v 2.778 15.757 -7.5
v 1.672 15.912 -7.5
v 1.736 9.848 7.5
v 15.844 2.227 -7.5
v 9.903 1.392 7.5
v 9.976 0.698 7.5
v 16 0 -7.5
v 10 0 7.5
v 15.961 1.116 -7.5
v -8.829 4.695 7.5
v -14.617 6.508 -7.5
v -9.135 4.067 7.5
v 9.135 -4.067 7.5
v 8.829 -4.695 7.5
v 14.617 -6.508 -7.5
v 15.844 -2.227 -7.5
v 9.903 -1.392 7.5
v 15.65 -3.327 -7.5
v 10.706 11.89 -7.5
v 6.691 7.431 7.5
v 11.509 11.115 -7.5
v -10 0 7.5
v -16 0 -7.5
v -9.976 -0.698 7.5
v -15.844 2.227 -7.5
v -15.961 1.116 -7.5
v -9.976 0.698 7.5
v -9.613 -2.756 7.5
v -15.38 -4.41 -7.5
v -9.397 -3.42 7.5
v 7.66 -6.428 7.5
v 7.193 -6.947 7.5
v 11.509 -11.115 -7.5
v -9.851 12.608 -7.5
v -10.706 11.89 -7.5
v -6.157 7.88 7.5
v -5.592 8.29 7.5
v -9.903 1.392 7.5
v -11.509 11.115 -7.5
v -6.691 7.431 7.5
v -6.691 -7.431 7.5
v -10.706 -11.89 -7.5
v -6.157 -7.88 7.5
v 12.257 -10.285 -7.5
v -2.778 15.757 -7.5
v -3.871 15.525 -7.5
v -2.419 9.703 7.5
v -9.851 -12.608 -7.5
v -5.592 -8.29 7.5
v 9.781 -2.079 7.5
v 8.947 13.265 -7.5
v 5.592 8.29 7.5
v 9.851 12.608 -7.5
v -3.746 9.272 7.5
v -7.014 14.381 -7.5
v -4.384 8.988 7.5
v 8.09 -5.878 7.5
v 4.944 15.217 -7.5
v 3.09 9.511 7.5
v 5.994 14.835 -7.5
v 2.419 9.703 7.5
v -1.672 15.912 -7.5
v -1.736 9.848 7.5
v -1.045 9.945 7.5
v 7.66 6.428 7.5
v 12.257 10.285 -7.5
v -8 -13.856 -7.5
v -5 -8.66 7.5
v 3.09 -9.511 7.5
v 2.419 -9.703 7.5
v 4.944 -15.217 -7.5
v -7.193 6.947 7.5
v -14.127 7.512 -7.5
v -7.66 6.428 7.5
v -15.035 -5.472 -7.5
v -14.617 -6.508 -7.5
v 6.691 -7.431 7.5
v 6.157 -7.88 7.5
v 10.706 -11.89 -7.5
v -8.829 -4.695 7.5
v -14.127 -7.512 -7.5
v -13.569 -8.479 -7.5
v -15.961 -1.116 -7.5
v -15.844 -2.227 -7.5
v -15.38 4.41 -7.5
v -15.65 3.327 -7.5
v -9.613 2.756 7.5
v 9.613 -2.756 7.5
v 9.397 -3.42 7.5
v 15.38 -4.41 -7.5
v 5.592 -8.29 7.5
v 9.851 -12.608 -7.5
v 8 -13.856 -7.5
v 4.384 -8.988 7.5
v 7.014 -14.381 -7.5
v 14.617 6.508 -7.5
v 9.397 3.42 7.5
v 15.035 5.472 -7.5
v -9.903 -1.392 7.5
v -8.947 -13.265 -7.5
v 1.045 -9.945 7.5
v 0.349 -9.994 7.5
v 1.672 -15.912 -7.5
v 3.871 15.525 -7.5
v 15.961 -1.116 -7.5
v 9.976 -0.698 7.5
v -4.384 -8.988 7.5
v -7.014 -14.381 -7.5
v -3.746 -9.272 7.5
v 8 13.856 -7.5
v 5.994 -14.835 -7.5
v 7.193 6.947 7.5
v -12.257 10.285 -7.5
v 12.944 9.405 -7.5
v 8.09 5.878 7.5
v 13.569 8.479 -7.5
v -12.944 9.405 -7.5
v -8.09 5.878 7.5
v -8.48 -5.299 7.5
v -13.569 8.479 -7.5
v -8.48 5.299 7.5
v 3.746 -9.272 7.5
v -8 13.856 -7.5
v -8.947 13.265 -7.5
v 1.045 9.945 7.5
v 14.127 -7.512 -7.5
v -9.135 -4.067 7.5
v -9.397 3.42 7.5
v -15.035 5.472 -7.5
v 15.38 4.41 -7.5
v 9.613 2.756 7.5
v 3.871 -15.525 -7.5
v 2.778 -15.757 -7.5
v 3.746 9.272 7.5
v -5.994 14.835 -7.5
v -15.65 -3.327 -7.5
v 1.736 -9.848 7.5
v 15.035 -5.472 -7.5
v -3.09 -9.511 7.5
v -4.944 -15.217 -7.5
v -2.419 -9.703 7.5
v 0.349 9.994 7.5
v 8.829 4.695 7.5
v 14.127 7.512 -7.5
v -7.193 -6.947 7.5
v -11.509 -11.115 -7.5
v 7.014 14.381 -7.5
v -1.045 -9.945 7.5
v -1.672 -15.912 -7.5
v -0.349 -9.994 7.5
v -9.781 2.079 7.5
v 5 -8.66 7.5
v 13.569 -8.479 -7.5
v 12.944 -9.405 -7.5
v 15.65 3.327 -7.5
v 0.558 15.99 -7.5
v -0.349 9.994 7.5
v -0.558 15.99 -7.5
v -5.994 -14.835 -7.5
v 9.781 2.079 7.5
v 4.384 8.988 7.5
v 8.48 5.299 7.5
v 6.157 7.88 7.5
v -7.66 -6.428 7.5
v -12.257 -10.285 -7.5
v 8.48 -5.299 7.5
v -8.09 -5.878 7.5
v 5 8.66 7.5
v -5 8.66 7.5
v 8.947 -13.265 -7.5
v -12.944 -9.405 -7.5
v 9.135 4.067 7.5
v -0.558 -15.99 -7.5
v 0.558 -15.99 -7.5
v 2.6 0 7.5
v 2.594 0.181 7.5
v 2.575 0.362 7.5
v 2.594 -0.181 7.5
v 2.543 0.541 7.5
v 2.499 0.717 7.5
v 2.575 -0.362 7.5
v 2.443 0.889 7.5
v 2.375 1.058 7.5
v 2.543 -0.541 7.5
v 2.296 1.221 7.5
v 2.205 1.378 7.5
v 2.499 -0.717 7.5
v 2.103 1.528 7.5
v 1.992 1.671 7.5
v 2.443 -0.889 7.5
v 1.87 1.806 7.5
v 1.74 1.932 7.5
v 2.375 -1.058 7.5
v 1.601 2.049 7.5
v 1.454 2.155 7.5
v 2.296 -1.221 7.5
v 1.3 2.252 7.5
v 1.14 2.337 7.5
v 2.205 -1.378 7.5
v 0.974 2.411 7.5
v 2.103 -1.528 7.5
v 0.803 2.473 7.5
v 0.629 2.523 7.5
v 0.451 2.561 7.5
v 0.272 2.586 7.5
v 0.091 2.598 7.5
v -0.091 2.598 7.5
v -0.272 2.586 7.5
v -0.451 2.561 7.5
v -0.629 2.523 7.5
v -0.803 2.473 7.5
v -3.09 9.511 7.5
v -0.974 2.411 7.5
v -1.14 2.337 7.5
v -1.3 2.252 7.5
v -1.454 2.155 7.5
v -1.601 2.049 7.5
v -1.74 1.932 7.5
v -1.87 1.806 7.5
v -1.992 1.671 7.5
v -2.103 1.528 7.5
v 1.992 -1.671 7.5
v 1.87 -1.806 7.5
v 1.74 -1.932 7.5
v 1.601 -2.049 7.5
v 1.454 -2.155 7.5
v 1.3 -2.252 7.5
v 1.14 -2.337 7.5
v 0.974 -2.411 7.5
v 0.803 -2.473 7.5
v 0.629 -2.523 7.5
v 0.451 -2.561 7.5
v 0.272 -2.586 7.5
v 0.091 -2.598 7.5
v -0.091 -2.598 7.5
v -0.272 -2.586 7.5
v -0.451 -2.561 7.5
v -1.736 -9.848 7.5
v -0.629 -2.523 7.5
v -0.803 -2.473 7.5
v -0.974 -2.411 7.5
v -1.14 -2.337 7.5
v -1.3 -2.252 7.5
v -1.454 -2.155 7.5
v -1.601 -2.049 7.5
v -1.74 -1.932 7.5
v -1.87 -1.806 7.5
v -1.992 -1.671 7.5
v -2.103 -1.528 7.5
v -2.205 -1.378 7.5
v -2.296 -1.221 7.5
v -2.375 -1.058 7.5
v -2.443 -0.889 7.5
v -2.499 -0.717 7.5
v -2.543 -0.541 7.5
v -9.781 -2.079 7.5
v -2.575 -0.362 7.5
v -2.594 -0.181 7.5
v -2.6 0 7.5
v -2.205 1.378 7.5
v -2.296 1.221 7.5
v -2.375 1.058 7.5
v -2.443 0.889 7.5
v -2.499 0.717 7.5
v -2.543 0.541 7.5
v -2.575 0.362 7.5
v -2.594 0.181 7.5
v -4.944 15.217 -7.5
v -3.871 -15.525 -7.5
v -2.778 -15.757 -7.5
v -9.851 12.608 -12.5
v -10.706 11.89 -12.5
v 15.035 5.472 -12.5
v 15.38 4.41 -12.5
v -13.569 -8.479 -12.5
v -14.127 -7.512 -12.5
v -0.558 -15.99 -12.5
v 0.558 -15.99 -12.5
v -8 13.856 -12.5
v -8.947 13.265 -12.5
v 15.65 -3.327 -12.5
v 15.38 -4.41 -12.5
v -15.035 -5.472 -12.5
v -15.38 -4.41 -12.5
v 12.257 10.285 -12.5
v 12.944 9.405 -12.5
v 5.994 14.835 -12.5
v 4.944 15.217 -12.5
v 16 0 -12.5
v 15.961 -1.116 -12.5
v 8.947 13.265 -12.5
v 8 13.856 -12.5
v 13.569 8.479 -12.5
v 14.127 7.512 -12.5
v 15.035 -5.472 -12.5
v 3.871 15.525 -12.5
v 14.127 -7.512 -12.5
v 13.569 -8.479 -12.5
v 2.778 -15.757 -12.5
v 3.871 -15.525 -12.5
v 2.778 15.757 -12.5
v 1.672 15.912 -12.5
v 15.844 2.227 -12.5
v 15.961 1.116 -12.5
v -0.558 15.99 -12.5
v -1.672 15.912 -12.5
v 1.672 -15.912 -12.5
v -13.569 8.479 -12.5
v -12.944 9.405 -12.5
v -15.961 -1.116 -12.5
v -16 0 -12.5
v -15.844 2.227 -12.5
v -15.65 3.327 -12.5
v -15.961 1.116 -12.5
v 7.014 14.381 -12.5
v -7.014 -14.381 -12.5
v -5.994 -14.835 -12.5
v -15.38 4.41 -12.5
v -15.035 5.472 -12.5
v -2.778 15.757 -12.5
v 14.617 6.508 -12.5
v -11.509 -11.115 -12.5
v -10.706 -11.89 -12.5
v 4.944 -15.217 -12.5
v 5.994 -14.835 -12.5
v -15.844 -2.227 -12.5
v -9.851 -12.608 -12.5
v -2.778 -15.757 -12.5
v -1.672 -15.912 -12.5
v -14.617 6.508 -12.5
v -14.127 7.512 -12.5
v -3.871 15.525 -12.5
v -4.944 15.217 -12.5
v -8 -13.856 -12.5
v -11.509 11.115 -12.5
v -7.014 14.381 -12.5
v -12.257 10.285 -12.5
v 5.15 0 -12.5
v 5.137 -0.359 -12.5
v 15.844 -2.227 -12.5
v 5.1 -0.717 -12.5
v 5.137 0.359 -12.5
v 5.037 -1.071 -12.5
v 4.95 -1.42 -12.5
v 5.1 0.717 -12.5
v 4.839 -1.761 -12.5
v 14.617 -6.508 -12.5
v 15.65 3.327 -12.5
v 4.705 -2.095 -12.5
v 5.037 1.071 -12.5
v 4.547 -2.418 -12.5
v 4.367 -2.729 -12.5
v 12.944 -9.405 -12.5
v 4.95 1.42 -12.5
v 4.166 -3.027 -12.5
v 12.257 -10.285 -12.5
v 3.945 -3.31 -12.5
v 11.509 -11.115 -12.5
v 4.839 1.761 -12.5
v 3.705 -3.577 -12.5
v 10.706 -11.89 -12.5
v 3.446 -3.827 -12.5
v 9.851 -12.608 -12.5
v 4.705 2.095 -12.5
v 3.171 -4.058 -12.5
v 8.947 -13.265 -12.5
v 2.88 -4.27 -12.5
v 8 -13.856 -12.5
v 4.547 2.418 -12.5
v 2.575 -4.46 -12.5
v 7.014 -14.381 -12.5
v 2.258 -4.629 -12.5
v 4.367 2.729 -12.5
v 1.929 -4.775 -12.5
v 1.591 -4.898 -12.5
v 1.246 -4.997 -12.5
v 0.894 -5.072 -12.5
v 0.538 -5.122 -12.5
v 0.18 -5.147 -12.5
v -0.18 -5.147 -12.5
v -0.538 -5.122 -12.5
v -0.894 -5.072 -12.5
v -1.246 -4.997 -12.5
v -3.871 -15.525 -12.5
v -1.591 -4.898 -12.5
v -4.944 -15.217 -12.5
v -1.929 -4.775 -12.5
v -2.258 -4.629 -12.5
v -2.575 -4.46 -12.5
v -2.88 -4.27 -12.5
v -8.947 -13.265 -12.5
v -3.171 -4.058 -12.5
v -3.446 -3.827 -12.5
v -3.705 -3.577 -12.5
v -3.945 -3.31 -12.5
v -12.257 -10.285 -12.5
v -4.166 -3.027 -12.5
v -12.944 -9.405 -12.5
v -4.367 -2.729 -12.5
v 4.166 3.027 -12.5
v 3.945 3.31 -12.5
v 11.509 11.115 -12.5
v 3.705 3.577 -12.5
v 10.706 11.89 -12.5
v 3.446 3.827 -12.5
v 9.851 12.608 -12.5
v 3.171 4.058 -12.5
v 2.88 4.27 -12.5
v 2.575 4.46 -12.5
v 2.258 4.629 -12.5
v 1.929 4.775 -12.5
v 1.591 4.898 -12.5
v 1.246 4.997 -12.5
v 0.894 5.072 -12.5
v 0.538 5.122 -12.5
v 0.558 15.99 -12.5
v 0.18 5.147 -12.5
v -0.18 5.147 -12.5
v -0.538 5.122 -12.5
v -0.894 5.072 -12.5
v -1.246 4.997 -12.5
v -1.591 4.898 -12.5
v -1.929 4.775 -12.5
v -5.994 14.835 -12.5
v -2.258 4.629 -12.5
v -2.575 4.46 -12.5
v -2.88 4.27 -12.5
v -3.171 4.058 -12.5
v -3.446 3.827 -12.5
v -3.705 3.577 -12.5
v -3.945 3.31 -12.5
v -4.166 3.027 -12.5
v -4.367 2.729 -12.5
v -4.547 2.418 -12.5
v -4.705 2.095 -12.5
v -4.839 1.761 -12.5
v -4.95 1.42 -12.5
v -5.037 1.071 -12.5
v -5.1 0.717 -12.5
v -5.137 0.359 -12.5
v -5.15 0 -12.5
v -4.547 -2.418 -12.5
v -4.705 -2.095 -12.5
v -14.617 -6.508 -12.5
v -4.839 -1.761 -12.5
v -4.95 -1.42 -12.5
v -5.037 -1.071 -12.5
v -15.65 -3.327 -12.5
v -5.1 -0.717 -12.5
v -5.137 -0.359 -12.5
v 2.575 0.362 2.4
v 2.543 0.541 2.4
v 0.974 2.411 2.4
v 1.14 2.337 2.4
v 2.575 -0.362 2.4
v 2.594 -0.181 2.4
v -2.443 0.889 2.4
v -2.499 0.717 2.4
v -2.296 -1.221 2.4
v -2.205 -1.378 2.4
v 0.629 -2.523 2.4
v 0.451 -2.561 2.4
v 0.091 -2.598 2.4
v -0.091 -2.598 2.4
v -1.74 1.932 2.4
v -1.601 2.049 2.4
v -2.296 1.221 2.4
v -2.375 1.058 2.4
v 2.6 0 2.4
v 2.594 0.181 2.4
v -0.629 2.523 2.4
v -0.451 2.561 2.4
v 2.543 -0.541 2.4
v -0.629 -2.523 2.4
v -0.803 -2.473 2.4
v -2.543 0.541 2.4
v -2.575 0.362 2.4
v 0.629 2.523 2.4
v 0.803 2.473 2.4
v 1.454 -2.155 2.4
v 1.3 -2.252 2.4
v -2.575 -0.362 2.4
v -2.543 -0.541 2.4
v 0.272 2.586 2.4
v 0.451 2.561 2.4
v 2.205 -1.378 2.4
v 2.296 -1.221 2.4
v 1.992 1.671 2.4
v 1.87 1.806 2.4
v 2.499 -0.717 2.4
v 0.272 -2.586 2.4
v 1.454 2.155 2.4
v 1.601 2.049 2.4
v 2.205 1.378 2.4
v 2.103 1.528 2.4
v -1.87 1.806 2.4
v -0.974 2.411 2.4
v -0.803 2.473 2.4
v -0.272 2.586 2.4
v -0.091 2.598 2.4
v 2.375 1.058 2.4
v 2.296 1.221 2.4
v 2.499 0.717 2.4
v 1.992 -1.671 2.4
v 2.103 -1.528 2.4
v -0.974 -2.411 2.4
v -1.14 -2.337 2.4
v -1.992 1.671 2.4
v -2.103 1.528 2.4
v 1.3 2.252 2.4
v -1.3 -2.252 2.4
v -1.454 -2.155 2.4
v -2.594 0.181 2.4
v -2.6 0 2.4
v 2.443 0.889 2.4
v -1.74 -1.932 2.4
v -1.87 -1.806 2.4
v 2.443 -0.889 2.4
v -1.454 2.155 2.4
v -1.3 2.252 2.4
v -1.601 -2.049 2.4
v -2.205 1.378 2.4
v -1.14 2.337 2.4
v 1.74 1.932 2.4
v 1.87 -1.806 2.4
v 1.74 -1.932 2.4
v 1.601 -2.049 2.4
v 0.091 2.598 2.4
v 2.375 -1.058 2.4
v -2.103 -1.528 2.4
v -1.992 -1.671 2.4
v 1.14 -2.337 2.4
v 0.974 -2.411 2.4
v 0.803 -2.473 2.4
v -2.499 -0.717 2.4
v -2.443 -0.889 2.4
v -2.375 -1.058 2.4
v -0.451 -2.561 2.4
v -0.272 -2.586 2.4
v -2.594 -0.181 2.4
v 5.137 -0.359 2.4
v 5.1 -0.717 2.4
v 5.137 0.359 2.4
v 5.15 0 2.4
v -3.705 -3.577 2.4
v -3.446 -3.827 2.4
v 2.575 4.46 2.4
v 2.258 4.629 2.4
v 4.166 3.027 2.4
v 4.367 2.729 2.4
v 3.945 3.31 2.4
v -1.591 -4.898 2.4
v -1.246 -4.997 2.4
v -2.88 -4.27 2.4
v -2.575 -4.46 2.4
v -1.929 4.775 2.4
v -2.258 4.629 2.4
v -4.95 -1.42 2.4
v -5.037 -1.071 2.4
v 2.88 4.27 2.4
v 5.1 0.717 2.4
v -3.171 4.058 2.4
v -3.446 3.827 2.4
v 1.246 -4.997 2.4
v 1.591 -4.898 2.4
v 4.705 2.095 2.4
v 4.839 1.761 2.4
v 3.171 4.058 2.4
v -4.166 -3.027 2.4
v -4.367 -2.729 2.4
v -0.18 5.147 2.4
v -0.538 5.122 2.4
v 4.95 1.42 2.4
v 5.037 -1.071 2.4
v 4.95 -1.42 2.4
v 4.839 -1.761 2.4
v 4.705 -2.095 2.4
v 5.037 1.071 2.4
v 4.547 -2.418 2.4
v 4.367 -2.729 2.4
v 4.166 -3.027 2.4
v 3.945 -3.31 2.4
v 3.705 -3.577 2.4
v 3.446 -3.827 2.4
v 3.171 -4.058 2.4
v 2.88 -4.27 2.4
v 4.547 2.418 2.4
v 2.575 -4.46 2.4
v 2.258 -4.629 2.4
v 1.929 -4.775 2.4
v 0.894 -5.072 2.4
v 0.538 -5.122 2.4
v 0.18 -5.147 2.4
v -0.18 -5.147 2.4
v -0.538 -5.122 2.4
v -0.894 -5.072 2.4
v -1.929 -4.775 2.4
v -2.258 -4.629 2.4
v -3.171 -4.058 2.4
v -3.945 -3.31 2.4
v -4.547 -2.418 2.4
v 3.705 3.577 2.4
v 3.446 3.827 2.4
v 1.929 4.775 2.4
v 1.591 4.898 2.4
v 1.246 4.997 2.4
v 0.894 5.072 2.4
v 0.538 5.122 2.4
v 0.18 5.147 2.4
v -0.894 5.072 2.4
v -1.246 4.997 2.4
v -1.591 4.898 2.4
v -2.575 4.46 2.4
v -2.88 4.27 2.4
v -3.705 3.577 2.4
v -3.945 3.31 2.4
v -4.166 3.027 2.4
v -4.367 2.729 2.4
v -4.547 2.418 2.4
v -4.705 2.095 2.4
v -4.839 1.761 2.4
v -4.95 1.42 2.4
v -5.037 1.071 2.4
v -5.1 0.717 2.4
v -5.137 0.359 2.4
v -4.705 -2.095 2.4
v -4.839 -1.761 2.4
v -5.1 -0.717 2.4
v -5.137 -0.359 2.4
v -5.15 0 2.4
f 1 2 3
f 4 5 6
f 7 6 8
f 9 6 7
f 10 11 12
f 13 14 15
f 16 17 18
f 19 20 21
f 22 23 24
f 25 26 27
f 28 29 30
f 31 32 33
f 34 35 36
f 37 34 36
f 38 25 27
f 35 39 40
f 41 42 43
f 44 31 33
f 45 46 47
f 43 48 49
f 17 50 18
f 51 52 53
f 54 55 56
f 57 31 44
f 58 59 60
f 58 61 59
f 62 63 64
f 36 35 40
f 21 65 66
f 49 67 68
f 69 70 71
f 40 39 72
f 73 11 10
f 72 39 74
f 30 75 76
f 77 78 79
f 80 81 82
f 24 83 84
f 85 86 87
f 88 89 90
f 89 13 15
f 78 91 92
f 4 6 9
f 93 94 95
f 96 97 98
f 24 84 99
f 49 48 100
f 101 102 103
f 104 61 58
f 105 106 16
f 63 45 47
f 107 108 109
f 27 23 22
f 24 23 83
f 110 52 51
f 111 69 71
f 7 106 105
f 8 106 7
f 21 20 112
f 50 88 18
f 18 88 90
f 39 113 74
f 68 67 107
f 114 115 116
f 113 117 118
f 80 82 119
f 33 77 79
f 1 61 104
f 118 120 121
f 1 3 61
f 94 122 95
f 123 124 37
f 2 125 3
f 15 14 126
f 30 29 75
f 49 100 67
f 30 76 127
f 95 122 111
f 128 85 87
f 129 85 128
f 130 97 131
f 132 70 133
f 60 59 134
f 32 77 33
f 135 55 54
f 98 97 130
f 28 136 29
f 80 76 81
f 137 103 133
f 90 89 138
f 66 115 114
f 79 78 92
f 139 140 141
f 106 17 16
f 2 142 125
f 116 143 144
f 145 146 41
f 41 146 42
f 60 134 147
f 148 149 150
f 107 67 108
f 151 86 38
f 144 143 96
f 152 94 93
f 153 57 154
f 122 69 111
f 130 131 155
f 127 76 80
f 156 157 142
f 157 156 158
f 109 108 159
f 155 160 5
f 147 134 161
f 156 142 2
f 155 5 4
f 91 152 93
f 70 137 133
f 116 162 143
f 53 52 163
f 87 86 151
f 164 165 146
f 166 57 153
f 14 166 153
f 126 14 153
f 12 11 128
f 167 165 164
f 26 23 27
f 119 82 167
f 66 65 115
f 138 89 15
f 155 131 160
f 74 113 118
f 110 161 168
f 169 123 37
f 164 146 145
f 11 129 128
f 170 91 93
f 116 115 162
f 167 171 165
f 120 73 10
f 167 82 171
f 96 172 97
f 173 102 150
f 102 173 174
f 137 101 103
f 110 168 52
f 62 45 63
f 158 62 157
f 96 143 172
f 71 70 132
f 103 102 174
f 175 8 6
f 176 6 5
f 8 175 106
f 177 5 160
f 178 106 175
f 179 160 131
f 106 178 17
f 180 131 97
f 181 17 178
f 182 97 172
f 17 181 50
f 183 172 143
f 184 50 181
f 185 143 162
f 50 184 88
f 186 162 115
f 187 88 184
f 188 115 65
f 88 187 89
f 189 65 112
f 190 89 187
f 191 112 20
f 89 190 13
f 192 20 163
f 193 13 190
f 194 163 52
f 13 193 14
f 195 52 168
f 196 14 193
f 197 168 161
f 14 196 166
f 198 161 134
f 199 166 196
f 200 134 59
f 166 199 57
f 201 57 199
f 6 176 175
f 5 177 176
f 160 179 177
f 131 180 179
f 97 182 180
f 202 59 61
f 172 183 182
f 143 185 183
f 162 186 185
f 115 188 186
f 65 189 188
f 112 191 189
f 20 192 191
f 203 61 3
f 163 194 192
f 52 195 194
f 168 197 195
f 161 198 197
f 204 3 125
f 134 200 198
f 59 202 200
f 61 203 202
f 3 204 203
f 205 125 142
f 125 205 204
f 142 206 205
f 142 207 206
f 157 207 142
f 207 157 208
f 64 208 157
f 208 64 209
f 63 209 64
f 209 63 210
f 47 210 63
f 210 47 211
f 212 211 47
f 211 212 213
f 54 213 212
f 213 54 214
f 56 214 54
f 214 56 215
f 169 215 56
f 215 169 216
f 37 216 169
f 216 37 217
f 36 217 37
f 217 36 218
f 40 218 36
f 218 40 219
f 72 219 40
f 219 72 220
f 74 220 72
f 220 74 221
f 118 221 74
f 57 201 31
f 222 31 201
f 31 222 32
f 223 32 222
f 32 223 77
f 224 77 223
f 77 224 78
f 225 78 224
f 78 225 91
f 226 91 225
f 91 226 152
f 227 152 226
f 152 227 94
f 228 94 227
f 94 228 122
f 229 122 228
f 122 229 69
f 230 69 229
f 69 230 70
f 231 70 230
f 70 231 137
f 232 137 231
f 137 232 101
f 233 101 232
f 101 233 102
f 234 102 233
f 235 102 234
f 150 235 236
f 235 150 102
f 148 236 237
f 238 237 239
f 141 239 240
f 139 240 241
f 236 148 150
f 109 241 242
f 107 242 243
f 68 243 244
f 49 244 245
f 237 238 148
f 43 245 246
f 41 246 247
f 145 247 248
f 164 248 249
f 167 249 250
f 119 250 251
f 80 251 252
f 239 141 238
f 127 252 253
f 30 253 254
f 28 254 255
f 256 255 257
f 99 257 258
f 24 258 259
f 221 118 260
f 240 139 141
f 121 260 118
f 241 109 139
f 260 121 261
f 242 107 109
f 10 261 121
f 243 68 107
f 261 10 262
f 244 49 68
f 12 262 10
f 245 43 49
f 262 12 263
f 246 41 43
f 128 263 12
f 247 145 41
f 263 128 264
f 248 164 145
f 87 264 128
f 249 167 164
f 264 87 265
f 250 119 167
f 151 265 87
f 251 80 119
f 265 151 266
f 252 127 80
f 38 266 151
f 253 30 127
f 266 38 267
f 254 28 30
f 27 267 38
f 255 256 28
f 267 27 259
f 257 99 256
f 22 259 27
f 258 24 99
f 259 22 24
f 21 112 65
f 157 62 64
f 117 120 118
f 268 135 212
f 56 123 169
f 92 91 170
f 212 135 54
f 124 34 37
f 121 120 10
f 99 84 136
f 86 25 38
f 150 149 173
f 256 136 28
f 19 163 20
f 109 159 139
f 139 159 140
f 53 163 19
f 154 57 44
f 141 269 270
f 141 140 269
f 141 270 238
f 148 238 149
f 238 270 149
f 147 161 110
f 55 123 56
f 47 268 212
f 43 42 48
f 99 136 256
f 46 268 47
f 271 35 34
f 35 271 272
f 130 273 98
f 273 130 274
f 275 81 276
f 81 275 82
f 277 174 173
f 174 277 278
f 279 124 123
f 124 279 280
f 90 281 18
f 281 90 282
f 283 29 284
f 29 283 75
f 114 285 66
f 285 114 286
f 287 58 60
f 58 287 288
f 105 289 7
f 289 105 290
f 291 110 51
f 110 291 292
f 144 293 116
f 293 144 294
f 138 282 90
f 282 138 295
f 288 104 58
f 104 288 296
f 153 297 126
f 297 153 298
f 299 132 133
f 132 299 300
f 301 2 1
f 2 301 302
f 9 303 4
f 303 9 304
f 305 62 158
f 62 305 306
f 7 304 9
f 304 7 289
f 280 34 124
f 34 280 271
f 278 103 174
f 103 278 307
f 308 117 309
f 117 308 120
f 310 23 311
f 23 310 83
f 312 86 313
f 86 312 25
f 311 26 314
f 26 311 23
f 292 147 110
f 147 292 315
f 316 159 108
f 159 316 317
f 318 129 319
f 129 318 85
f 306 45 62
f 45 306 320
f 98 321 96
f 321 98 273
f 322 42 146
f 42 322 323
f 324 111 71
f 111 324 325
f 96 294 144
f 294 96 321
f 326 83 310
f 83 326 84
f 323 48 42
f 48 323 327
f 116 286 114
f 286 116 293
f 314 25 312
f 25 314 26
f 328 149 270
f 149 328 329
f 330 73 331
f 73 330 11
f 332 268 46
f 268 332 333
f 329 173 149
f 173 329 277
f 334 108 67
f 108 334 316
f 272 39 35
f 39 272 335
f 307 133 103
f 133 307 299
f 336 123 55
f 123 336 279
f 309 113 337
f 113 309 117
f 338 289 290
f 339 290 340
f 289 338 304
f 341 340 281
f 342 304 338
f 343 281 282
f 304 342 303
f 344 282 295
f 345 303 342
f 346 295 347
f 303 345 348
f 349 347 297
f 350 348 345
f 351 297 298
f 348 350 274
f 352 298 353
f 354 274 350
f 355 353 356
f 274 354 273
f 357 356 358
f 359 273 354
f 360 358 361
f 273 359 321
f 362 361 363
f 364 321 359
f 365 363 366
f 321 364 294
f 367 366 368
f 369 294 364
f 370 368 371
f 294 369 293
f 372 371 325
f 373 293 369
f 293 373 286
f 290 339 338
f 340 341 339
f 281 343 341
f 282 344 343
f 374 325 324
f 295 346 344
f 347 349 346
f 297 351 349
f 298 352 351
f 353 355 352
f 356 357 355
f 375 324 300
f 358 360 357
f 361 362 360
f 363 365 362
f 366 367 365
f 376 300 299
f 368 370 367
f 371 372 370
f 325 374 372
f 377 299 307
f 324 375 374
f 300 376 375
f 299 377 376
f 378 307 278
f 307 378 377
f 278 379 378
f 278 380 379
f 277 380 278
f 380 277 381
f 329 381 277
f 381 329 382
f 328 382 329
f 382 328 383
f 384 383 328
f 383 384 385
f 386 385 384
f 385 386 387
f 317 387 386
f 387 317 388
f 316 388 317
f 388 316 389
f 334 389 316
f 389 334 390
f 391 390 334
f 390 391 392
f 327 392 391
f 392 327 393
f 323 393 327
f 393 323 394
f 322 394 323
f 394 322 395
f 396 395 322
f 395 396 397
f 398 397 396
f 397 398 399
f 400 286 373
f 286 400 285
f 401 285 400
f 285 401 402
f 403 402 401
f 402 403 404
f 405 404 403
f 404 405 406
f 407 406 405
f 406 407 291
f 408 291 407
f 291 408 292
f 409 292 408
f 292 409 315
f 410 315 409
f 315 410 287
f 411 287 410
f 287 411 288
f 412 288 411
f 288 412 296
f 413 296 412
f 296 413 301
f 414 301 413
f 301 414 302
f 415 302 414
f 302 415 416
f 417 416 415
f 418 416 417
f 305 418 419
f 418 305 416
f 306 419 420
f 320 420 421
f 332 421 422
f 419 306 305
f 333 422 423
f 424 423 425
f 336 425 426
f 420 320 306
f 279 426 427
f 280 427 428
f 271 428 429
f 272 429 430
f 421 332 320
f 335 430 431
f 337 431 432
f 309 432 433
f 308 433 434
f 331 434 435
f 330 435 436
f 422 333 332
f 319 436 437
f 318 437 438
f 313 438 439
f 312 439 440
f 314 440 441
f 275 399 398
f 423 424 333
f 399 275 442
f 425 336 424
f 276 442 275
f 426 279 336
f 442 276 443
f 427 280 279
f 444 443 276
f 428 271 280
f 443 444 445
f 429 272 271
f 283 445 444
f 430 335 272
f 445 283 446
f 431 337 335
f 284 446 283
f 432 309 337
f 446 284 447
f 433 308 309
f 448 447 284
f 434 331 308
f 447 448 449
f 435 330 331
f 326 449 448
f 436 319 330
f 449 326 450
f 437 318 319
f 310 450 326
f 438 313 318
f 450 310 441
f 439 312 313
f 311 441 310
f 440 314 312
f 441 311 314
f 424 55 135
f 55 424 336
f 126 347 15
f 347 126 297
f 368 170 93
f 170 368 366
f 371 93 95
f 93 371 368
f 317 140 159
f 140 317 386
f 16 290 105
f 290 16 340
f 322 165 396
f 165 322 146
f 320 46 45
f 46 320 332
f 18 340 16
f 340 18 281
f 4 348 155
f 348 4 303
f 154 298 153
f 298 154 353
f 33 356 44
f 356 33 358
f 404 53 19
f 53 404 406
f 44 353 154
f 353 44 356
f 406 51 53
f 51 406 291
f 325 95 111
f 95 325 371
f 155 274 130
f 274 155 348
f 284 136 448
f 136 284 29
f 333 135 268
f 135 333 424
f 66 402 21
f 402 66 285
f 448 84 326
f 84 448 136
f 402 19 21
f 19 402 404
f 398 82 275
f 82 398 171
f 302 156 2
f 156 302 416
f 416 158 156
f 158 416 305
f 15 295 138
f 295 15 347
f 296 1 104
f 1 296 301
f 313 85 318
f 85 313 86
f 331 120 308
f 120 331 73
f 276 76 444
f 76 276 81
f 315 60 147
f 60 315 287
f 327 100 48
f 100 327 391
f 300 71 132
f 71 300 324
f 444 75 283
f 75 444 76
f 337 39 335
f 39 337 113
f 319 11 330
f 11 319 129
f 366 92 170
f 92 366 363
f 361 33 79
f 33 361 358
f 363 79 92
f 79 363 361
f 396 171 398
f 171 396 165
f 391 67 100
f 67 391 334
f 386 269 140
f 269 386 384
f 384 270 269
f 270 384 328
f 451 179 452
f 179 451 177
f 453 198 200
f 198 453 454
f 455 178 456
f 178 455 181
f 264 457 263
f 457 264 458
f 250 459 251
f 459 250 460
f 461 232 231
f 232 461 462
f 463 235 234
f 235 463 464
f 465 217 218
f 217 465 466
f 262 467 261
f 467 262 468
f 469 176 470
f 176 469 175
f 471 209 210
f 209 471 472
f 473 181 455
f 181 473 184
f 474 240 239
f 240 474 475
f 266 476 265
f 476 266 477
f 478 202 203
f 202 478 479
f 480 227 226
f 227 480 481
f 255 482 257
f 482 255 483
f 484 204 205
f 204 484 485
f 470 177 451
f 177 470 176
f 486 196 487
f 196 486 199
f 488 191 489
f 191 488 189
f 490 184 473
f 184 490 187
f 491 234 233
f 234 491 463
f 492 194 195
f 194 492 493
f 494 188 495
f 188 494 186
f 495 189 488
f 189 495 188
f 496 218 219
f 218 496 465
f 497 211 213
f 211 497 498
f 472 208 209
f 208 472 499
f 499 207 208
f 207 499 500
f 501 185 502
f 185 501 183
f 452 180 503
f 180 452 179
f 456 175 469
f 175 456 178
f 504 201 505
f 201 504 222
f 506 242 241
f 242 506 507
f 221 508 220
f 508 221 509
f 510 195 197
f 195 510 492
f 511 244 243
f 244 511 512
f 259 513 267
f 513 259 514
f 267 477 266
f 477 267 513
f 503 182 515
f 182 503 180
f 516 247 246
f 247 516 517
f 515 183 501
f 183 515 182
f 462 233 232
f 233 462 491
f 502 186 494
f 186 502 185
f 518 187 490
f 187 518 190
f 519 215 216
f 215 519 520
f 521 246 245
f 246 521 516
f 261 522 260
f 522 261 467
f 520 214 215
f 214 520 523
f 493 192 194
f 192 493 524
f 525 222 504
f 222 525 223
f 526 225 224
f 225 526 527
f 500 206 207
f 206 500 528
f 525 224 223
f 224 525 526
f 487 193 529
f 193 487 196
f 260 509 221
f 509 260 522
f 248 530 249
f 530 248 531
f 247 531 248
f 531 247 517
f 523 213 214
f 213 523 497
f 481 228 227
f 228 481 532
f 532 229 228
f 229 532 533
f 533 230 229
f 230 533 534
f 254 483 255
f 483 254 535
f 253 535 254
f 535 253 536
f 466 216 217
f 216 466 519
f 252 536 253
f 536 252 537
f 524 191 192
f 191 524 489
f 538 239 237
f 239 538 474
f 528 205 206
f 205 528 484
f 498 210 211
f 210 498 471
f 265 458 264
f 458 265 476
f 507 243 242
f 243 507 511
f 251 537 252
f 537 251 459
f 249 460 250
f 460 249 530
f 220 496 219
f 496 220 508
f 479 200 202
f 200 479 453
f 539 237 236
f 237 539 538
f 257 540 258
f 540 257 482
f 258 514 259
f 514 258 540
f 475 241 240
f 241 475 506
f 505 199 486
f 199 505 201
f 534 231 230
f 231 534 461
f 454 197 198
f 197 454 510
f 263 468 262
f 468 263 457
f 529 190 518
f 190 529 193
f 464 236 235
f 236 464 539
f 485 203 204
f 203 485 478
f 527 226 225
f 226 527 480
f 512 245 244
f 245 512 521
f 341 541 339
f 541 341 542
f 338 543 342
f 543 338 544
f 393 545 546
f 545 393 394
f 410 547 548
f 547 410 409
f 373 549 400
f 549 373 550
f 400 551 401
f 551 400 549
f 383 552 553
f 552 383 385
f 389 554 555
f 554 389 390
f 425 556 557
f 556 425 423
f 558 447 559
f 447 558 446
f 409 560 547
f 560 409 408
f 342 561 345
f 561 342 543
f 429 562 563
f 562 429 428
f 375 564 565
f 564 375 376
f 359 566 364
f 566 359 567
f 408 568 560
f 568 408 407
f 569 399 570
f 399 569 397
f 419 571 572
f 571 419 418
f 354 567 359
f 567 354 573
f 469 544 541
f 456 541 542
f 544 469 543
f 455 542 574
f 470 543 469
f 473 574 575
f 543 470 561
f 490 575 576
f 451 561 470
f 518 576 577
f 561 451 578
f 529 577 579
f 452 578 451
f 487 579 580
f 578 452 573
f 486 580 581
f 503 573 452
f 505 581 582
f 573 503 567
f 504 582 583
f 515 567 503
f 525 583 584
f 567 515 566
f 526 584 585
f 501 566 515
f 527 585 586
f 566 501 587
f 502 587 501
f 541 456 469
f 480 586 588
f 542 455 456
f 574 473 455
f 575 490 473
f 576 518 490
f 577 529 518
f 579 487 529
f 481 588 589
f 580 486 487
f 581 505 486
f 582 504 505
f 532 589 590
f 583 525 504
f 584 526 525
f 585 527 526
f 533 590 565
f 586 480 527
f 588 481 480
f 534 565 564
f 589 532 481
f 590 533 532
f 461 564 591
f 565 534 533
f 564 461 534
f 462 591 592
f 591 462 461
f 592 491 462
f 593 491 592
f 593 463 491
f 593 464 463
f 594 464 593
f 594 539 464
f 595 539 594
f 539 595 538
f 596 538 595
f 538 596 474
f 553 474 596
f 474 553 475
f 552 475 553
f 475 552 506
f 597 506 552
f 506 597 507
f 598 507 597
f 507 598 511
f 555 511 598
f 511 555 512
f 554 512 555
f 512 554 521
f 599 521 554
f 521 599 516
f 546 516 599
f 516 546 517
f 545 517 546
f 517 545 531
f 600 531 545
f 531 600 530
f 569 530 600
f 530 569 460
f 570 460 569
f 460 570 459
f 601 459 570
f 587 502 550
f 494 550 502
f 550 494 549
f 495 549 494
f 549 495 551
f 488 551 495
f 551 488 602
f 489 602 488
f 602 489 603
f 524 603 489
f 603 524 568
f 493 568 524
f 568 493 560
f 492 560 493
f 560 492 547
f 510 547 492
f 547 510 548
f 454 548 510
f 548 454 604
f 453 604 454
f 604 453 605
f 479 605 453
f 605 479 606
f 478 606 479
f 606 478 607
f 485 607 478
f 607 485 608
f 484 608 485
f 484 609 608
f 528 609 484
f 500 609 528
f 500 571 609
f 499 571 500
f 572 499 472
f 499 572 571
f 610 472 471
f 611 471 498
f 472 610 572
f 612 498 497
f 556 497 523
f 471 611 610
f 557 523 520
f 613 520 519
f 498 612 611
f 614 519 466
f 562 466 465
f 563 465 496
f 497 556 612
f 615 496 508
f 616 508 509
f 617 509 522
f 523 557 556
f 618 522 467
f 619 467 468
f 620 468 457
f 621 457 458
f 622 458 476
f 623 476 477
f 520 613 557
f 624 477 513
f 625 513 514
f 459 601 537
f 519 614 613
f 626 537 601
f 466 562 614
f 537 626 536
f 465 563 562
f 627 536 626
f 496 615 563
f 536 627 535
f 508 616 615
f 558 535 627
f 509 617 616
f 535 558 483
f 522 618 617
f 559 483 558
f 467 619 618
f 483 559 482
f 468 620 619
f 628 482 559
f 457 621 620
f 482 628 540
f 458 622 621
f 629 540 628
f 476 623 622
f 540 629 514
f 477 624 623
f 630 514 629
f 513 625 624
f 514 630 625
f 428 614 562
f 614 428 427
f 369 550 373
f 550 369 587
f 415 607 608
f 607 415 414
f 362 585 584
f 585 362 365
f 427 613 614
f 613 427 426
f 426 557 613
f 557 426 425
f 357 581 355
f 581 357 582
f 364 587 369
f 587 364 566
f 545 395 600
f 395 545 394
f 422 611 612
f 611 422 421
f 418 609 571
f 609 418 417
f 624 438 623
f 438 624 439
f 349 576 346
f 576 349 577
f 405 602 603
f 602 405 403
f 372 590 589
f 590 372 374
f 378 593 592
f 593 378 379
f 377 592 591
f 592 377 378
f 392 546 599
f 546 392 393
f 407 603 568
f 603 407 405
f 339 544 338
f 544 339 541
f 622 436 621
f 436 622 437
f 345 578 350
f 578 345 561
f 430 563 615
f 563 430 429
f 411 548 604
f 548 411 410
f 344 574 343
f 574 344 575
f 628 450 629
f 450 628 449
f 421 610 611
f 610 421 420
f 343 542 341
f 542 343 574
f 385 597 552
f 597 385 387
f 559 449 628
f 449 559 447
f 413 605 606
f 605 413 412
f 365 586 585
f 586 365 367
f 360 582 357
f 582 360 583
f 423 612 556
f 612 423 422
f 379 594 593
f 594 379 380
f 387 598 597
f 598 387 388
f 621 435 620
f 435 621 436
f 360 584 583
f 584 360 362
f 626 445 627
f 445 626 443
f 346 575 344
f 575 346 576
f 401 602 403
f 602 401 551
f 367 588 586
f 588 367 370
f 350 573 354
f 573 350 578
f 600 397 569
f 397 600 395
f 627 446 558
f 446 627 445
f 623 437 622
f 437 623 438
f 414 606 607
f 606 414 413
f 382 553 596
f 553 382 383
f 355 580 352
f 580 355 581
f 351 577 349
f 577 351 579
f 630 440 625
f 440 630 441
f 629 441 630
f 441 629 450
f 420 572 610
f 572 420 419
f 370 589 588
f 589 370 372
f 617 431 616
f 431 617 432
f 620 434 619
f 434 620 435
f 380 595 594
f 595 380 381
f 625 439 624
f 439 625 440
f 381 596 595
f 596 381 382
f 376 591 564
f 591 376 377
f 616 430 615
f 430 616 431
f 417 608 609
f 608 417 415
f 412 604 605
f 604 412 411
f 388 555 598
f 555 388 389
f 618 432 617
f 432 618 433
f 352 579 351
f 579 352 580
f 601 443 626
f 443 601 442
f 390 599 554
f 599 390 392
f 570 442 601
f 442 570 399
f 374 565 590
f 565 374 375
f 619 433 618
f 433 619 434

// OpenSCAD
$fn=90;

difference(){
    body();
    cylinder(22,d=5.2,center=true);
    translate([0,0,-5.1]) cylinder(15,d=10.3,center=true);
}

module body(){
cylinder(15,d1=32,d2=20,center=true);
translate([0,0,-10]) cylinder(5,d=32,center=true);
}
